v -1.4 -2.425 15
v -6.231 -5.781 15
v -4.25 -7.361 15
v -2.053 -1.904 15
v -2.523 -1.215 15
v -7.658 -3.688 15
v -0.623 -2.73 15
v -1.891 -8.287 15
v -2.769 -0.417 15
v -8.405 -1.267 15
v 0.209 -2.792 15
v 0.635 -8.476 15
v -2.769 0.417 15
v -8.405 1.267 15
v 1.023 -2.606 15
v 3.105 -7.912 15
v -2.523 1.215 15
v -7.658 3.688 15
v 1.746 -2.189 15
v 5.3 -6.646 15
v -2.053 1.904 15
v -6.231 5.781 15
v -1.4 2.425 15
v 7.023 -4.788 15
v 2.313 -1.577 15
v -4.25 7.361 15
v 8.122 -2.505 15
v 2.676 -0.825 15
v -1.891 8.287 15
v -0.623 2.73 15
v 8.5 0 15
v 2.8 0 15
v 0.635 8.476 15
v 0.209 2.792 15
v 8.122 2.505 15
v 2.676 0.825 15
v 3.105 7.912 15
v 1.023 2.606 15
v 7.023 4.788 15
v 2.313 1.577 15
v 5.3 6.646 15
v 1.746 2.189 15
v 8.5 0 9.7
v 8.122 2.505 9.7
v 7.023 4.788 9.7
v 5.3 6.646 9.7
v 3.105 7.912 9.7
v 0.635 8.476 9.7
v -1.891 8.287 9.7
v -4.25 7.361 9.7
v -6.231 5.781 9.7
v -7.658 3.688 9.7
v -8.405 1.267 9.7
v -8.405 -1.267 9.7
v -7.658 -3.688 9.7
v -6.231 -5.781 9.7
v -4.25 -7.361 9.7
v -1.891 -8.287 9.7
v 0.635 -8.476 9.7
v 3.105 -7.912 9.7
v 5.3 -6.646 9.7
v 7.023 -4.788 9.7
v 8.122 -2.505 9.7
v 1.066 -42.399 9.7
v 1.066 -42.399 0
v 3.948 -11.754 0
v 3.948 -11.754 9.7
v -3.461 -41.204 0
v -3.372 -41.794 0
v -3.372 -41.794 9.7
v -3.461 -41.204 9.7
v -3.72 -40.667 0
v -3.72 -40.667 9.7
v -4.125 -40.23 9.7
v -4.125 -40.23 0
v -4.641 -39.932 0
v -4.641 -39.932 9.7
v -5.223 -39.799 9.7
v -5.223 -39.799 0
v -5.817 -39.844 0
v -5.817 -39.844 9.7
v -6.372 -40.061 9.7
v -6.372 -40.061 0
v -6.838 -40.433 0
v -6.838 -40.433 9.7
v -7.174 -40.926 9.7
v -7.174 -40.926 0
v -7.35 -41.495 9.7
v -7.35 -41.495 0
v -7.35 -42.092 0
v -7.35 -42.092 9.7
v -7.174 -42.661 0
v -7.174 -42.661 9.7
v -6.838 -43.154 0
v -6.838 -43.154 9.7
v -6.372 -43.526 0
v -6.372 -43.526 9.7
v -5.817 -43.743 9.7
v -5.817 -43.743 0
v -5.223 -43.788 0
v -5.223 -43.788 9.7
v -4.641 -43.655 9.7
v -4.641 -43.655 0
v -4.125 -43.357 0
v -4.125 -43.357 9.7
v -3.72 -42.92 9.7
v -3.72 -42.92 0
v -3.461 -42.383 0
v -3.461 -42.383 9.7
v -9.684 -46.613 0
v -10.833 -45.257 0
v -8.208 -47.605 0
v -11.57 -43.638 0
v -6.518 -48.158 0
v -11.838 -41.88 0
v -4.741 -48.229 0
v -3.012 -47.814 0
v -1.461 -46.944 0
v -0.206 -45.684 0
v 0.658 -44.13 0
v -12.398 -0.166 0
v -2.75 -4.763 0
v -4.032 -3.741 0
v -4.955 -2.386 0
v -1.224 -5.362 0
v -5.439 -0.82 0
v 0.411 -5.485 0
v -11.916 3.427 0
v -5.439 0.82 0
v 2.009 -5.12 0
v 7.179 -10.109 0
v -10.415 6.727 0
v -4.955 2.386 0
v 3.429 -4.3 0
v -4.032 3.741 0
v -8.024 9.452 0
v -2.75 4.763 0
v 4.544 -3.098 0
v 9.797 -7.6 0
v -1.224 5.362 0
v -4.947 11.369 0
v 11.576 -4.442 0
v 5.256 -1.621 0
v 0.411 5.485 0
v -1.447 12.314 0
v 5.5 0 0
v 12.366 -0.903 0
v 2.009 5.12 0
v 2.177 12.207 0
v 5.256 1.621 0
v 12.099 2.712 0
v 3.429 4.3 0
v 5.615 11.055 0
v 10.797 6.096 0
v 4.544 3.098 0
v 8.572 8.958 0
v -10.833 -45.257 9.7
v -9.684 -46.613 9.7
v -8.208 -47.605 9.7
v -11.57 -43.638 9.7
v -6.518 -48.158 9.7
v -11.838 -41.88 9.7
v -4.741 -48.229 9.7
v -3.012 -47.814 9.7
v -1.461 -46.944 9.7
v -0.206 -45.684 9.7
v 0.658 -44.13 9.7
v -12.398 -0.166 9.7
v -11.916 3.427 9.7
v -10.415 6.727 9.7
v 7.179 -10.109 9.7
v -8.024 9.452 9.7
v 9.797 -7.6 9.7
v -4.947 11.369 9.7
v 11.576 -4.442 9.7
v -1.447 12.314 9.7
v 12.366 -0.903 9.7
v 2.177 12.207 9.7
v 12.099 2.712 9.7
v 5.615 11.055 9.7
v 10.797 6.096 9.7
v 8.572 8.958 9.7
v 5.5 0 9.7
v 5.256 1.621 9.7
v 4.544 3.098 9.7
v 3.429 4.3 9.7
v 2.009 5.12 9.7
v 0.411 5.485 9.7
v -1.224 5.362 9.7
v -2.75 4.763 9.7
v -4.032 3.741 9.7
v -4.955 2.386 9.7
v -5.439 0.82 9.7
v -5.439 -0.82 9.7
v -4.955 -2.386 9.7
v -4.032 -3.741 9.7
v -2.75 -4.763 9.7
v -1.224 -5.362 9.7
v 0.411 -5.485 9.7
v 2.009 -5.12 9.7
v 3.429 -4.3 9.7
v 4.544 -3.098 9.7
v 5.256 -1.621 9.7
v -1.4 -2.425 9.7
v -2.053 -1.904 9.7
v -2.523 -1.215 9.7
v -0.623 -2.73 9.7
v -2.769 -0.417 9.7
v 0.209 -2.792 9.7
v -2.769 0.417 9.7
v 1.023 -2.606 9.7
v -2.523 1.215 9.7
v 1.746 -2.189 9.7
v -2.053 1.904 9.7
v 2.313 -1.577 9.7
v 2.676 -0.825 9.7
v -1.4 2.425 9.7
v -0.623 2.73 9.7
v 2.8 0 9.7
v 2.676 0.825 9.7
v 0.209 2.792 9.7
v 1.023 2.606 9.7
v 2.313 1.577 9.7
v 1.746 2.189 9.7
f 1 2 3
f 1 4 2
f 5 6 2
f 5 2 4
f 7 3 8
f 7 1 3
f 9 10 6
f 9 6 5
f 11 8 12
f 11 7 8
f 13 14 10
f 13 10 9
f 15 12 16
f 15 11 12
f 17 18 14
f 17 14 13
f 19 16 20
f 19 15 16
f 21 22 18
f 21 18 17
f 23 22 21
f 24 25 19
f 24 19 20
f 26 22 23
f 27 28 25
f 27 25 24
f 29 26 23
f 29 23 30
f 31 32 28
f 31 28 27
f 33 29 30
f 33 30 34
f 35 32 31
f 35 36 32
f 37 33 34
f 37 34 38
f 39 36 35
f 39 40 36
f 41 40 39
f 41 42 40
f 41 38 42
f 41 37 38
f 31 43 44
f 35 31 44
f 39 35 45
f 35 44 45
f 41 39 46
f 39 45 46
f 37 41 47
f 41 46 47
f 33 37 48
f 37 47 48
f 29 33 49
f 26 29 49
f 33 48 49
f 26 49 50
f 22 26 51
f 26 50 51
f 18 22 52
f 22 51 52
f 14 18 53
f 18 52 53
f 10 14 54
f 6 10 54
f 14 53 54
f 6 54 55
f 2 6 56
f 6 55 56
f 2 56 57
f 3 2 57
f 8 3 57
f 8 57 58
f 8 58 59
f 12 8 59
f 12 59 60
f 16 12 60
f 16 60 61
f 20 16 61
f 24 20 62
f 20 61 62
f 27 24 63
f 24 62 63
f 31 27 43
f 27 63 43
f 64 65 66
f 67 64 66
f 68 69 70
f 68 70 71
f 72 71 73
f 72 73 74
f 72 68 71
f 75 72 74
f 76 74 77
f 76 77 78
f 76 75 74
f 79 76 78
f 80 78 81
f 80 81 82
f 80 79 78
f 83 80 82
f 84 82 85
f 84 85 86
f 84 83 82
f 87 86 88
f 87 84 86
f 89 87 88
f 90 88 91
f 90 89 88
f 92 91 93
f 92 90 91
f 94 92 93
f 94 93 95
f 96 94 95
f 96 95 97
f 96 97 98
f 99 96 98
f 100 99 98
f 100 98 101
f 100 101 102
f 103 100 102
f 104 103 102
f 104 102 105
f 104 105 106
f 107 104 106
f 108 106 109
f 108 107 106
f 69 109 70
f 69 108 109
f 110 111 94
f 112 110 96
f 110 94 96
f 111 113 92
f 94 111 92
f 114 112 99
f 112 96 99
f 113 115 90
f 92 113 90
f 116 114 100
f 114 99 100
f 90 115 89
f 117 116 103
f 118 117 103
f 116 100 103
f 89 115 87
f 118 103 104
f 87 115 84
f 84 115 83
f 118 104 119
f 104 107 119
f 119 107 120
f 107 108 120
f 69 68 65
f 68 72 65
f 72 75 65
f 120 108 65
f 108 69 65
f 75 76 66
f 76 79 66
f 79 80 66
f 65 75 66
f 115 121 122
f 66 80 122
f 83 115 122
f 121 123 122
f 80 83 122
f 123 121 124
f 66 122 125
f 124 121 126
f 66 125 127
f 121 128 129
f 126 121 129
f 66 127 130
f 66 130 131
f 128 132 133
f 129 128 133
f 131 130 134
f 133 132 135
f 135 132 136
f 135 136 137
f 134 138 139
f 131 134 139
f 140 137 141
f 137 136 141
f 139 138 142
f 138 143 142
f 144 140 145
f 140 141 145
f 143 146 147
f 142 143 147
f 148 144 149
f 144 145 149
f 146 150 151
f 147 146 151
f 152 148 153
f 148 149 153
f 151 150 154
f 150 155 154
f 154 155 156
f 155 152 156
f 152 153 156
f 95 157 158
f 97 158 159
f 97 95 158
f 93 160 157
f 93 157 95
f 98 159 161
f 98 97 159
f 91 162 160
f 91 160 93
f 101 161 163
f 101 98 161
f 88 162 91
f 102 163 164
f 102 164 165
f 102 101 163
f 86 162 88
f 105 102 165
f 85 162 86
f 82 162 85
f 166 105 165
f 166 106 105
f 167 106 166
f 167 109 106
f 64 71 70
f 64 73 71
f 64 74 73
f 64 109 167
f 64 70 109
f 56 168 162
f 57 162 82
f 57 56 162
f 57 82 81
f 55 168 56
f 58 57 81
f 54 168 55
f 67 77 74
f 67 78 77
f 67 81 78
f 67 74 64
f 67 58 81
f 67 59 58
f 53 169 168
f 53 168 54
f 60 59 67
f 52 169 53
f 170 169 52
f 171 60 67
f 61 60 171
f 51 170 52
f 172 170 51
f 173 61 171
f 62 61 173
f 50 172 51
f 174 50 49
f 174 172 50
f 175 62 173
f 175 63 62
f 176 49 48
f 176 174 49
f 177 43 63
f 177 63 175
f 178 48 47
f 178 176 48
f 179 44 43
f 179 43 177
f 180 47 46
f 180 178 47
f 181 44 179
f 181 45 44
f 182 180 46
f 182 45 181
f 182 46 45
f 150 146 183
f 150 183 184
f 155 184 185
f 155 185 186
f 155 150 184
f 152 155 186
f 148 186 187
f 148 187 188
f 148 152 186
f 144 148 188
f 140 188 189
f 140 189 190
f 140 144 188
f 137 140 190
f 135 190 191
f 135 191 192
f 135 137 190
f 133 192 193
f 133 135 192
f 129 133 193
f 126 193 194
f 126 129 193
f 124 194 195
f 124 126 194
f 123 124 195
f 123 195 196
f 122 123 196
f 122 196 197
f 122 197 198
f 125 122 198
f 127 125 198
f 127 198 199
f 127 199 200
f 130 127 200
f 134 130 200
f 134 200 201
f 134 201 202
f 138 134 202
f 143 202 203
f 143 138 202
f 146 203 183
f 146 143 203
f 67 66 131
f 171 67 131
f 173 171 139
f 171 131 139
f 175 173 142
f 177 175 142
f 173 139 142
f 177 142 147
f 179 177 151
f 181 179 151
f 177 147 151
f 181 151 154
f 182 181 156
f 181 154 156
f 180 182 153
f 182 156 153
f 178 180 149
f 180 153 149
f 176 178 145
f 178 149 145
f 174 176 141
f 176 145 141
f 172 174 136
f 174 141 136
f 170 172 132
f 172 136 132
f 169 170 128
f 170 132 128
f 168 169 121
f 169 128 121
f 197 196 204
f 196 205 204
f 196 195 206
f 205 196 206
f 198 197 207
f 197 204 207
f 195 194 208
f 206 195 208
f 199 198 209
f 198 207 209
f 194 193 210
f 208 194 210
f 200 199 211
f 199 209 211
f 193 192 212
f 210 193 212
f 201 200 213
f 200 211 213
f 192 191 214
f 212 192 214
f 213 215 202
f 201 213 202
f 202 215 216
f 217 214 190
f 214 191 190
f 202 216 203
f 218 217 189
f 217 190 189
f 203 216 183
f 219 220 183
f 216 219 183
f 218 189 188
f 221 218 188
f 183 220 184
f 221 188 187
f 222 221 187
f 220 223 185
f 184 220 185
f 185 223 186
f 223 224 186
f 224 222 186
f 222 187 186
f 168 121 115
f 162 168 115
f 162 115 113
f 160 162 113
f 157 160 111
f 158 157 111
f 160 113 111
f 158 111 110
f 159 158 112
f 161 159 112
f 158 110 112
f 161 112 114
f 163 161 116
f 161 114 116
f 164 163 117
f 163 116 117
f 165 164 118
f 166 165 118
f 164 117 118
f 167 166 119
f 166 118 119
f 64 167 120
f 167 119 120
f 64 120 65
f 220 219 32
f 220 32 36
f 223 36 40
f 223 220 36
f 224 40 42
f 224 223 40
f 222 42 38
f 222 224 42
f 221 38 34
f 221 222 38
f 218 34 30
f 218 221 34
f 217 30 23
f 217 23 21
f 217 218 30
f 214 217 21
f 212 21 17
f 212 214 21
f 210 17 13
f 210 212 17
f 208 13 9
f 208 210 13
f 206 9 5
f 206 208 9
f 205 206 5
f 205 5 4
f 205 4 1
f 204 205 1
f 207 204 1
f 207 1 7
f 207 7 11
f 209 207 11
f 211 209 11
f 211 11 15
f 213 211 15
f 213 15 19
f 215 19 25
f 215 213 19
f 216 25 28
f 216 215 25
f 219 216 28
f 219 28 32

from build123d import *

# Parameters (mm, degrees)
ESBO_O1_R                = 5.5
ESBO_O1_R_2              = 2
RESSALTO_EXTRUS_O1_DEPTH = 9.7
ESBO_O2_R                = 8.5
ESBO_O2_R_2              = 2.8
RESSALTO_EXTRUS_O2_DEPTH = 5.3


with BuildPart() as part:
    # Esboço1 → Ressalto-extrusão1 (new body)
    with BuildSketch(Plane.XY):
        with BuildLine():
            Line((-12.397968723, -0.166390596), (-11.838135129, -41.880282782))
            ThreePointArc((-11.838135129, -41.880282782), (-5.631724082, -48.255001448), (1.066308546, -42.398984451))
            Line((1.066308546, -42.398984451), (3.948309434, -11.753644835))
            ThreePointArc((3.948309434, -11.753644835), (7.17044634, 10.115434423), (-12.397968723, -0.166390596))
        make_face()
        Circle(ESBO_O1_R, mode=Mode.SUBTRACT)
        with Locations((-5.372000333, -41.793502112)):
            Circle(ESBO_O1_R_2, mode=Mode.SUBTRACT)
    extrude(amount=RESSALTO_EXTRUS_O1_DEPTH)

    # Esboço2 → Ressalto-extrusão2 (add)
    with BuildSketch(Plane.XY.offset(9.7)):
        Circle(ESBO_O2_R)
        Circle(ESBO_O2_R_2, mode=Mode.SUBTRACT)
    extrude(amount=RESSALTO_EXTRUS_O2_DEPTH)


solid = part.part
